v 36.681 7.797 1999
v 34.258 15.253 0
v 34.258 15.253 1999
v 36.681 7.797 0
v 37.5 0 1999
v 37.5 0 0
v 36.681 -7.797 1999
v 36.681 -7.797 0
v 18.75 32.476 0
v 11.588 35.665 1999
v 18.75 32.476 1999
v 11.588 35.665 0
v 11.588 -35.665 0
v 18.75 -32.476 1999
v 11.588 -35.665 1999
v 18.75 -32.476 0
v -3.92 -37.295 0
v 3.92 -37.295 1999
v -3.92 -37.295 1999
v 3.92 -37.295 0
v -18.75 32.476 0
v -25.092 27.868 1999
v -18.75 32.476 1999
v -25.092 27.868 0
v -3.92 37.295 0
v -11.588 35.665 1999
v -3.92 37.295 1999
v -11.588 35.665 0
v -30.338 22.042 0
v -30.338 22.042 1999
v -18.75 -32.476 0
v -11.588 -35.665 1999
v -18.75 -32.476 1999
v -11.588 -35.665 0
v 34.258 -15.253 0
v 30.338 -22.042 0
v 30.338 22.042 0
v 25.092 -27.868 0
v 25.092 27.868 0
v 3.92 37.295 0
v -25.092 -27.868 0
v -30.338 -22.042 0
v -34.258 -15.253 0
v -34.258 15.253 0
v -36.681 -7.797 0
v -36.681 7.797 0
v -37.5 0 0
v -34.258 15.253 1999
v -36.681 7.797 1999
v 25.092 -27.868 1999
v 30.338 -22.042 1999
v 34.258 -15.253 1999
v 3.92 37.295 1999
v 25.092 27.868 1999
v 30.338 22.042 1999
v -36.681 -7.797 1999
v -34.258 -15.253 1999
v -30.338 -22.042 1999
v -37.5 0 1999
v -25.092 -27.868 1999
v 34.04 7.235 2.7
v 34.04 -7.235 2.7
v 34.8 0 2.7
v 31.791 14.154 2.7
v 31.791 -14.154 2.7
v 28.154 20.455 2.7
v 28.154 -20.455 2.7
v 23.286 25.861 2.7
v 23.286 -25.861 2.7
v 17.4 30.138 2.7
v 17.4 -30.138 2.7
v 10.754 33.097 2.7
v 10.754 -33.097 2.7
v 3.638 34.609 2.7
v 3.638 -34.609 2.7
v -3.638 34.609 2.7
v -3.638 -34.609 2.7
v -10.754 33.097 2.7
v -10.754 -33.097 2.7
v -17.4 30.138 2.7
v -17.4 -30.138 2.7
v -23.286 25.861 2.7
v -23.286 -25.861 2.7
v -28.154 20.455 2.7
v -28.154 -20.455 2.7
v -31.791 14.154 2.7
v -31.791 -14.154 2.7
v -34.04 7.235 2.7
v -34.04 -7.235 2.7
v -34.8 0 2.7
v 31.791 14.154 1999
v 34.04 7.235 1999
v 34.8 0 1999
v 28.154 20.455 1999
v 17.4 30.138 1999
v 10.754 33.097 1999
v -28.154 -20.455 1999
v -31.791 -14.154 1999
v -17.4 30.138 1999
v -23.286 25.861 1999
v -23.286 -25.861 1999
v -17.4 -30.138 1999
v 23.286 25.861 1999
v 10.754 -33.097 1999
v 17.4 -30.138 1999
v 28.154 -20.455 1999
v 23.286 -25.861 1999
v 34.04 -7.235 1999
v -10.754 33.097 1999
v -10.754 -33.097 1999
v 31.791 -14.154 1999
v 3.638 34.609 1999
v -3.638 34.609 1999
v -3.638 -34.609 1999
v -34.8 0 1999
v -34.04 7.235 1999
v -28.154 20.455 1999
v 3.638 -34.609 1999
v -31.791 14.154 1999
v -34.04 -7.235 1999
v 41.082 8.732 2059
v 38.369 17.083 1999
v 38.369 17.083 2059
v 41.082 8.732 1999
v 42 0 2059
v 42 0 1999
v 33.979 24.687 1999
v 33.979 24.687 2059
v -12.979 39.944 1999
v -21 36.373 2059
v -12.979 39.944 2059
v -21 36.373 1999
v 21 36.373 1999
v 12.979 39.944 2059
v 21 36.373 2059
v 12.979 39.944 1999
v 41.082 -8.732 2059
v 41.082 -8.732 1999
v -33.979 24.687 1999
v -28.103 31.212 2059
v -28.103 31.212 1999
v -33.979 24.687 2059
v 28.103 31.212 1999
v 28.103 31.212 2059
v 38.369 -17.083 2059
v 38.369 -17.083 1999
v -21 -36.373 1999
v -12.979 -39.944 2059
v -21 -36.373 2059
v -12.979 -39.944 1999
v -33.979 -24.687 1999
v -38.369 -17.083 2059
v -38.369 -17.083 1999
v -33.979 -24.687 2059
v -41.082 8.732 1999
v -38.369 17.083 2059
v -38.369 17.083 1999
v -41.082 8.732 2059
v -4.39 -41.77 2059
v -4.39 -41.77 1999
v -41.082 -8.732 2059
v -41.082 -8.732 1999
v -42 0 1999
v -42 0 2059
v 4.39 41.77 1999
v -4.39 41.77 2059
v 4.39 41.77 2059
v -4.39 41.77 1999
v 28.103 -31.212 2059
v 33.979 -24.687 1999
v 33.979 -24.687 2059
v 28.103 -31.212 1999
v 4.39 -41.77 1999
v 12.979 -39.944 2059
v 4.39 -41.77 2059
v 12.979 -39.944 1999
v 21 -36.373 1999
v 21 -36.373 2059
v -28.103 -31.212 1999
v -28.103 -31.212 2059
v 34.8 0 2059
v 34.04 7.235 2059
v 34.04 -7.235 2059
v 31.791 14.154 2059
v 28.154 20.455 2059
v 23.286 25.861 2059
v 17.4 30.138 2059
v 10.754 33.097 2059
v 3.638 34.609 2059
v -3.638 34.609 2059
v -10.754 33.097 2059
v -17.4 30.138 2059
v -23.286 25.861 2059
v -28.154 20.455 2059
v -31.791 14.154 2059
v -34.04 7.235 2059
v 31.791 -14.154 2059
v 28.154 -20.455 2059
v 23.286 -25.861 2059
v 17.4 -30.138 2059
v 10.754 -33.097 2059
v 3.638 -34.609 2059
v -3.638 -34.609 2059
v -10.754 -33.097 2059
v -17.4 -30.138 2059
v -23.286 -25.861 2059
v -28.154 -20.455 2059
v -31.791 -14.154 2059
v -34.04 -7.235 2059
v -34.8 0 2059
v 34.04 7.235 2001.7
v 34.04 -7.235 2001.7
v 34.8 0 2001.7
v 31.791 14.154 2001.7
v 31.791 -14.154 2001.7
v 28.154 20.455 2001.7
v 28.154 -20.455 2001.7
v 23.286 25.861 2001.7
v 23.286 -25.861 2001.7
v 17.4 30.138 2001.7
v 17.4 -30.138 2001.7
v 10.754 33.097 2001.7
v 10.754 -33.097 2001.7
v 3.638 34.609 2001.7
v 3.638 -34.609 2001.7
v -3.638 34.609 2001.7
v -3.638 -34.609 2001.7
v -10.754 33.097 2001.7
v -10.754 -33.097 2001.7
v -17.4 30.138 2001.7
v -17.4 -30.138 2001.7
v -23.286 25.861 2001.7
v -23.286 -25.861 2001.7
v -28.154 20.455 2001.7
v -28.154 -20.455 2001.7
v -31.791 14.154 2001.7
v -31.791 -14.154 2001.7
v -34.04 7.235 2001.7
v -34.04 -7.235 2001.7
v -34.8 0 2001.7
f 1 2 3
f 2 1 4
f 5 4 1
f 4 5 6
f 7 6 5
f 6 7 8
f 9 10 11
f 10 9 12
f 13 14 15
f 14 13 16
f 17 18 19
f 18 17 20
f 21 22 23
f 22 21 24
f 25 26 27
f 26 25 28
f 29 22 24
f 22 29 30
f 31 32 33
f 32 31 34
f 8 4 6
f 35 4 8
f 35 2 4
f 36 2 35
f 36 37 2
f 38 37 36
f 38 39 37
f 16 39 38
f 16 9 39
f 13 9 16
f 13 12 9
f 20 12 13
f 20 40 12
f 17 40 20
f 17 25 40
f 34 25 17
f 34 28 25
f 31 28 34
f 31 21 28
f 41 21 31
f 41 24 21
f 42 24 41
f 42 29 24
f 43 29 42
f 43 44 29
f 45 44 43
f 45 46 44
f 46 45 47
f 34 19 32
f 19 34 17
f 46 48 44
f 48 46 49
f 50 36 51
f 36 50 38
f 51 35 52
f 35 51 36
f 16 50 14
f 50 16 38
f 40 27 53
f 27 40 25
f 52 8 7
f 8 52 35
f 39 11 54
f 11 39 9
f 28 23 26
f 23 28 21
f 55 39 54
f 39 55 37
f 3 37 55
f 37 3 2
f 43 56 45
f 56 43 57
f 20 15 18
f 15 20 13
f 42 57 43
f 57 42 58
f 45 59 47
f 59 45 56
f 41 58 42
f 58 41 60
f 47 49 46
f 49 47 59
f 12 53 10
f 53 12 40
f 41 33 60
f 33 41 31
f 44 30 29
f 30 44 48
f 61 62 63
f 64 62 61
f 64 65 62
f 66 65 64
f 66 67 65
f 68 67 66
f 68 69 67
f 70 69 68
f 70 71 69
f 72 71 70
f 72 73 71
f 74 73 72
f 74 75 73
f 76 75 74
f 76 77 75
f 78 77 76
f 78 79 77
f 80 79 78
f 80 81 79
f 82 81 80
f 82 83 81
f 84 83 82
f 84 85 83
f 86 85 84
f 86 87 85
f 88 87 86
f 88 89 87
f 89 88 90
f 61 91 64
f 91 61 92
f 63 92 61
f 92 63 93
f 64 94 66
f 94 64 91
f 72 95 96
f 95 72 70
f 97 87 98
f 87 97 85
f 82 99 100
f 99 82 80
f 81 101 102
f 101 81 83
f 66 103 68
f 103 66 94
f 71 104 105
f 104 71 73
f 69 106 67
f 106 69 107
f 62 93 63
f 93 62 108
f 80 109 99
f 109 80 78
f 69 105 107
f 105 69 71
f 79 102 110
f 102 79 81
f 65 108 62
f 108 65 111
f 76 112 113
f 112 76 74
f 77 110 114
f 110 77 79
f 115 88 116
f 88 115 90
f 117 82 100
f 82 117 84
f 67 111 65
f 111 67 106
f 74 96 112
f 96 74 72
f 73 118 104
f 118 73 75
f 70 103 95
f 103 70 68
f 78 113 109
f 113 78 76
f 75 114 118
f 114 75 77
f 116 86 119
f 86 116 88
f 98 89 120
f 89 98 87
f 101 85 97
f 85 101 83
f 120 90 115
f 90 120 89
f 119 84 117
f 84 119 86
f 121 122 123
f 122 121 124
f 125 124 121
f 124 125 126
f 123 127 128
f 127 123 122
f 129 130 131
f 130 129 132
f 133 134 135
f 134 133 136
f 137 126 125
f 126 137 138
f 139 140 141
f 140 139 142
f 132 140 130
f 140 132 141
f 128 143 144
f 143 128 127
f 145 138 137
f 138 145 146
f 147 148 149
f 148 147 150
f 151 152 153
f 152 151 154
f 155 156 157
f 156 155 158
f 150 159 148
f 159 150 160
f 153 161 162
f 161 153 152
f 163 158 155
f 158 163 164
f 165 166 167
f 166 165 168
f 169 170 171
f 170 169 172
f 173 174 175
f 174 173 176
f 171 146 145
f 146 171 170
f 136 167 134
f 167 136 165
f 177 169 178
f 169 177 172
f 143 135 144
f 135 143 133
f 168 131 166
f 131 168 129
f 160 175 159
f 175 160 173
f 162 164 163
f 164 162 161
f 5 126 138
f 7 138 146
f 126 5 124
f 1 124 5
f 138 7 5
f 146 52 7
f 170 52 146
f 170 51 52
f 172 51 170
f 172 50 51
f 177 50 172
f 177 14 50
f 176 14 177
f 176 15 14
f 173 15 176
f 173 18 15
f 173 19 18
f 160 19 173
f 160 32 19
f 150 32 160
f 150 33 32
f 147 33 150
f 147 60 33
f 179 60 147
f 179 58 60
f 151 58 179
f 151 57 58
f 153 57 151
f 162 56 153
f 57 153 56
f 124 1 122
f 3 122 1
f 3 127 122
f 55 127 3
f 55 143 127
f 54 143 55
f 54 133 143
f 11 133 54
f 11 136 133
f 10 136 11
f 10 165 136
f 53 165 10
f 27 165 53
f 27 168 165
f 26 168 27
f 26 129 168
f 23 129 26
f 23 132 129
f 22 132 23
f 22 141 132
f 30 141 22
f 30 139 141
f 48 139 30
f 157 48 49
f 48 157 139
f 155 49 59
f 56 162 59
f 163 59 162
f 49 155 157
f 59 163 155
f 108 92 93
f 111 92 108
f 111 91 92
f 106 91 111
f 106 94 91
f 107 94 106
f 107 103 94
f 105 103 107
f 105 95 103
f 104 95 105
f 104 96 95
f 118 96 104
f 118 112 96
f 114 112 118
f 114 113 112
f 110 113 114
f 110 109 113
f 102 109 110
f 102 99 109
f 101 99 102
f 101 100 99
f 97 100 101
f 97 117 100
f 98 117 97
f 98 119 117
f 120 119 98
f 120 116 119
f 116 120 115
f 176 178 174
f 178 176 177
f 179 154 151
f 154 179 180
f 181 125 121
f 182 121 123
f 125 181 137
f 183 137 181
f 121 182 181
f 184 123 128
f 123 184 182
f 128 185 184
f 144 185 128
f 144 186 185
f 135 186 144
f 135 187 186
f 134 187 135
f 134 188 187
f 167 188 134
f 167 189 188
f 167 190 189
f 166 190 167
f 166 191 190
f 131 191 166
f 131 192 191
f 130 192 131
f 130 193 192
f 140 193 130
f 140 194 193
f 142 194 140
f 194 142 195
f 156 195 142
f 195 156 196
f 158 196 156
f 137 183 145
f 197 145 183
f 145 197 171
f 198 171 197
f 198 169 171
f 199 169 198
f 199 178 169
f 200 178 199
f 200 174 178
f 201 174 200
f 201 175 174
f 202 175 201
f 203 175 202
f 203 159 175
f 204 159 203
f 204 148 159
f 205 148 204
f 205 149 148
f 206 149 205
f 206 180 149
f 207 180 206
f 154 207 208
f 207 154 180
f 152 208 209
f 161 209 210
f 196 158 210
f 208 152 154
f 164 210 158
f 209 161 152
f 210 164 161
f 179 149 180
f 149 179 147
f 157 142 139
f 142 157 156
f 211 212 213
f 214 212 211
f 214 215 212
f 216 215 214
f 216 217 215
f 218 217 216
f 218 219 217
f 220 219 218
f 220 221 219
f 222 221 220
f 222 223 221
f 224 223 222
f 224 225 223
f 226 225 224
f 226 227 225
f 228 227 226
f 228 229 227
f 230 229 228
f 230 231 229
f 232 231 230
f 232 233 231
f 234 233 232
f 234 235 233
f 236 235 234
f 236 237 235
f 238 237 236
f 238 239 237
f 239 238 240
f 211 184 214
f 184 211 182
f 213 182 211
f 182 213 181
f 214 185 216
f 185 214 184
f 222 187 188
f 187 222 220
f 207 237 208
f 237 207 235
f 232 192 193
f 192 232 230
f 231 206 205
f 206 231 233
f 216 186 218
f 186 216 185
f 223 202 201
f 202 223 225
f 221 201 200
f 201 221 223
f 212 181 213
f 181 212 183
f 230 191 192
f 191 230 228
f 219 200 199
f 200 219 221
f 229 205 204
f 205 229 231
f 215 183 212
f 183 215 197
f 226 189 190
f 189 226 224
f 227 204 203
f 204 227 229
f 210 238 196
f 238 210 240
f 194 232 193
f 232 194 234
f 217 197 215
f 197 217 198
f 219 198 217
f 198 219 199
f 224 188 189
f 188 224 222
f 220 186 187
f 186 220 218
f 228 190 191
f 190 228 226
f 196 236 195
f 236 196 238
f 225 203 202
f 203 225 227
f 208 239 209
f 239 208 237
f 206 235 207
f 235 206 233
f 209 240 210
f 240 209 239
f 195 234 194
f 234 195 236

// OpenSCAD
// Parameters
nominal_size = 75; //[50:150:1]
length_mm = 2000; //[1000:4000:10]
pipe_od = 75; //[60:110:1]
pipe_wall = 2.7; //[1.5:5.5:0.1]
overlap = 1; //[0.5:2:0.1]
fitting_length = 60; //[30:120:1]
fitting_od_scale = 1.12; //[1.02:1.3:0.01]
fitting_wall_scale = 1.25; //[1.0:2.0:0.05]
fitting_stop_thickness = 4; //[2:10:0.5]

// HT Pipe - complete geometry
module ht_pipe() {
  color([0.85, 0.85, 0.8]) {
    // Pipe Body
    difference() {
      cylinder(h=length_mm, r=pipe_od/2, center=false);
      translate([0, 0, pipe_wall])
        cylinder(h=length_mm, r=pipe_od/2 - pipe_wall, center=false);
    }
    
    // End Fitting
    translate([0, 0, length_mm - overlap]) {
      difference() {
        cylinder(h=fitting_length, r=(pipe_od*fitting_od_scale)/2, center=false);
        translate([0, 0, pipe_wall])
          cylinder(h=fitting_length, r=pipe_od/2 - pipe_wall, center=false);
      }
      
      // Stop Ring
      translate([0, 0, fitting_length - fitting_stop_thickness]) {
        difference() {
          cylinder(h=fitting_stop_thickness, r=pipe_od/2 - pipe_wall + fitting_stop_thickness, center=false);
          translate([0, 0, -overlap])
            cylinder(h=fitting_stop_thickness + overlap, r=pipe_od/2 - pipe_wall, center=false);
        }
      }
    }
  }
}

// Assembly
module assembly() {
  ht_pipe();
}

assembly();
